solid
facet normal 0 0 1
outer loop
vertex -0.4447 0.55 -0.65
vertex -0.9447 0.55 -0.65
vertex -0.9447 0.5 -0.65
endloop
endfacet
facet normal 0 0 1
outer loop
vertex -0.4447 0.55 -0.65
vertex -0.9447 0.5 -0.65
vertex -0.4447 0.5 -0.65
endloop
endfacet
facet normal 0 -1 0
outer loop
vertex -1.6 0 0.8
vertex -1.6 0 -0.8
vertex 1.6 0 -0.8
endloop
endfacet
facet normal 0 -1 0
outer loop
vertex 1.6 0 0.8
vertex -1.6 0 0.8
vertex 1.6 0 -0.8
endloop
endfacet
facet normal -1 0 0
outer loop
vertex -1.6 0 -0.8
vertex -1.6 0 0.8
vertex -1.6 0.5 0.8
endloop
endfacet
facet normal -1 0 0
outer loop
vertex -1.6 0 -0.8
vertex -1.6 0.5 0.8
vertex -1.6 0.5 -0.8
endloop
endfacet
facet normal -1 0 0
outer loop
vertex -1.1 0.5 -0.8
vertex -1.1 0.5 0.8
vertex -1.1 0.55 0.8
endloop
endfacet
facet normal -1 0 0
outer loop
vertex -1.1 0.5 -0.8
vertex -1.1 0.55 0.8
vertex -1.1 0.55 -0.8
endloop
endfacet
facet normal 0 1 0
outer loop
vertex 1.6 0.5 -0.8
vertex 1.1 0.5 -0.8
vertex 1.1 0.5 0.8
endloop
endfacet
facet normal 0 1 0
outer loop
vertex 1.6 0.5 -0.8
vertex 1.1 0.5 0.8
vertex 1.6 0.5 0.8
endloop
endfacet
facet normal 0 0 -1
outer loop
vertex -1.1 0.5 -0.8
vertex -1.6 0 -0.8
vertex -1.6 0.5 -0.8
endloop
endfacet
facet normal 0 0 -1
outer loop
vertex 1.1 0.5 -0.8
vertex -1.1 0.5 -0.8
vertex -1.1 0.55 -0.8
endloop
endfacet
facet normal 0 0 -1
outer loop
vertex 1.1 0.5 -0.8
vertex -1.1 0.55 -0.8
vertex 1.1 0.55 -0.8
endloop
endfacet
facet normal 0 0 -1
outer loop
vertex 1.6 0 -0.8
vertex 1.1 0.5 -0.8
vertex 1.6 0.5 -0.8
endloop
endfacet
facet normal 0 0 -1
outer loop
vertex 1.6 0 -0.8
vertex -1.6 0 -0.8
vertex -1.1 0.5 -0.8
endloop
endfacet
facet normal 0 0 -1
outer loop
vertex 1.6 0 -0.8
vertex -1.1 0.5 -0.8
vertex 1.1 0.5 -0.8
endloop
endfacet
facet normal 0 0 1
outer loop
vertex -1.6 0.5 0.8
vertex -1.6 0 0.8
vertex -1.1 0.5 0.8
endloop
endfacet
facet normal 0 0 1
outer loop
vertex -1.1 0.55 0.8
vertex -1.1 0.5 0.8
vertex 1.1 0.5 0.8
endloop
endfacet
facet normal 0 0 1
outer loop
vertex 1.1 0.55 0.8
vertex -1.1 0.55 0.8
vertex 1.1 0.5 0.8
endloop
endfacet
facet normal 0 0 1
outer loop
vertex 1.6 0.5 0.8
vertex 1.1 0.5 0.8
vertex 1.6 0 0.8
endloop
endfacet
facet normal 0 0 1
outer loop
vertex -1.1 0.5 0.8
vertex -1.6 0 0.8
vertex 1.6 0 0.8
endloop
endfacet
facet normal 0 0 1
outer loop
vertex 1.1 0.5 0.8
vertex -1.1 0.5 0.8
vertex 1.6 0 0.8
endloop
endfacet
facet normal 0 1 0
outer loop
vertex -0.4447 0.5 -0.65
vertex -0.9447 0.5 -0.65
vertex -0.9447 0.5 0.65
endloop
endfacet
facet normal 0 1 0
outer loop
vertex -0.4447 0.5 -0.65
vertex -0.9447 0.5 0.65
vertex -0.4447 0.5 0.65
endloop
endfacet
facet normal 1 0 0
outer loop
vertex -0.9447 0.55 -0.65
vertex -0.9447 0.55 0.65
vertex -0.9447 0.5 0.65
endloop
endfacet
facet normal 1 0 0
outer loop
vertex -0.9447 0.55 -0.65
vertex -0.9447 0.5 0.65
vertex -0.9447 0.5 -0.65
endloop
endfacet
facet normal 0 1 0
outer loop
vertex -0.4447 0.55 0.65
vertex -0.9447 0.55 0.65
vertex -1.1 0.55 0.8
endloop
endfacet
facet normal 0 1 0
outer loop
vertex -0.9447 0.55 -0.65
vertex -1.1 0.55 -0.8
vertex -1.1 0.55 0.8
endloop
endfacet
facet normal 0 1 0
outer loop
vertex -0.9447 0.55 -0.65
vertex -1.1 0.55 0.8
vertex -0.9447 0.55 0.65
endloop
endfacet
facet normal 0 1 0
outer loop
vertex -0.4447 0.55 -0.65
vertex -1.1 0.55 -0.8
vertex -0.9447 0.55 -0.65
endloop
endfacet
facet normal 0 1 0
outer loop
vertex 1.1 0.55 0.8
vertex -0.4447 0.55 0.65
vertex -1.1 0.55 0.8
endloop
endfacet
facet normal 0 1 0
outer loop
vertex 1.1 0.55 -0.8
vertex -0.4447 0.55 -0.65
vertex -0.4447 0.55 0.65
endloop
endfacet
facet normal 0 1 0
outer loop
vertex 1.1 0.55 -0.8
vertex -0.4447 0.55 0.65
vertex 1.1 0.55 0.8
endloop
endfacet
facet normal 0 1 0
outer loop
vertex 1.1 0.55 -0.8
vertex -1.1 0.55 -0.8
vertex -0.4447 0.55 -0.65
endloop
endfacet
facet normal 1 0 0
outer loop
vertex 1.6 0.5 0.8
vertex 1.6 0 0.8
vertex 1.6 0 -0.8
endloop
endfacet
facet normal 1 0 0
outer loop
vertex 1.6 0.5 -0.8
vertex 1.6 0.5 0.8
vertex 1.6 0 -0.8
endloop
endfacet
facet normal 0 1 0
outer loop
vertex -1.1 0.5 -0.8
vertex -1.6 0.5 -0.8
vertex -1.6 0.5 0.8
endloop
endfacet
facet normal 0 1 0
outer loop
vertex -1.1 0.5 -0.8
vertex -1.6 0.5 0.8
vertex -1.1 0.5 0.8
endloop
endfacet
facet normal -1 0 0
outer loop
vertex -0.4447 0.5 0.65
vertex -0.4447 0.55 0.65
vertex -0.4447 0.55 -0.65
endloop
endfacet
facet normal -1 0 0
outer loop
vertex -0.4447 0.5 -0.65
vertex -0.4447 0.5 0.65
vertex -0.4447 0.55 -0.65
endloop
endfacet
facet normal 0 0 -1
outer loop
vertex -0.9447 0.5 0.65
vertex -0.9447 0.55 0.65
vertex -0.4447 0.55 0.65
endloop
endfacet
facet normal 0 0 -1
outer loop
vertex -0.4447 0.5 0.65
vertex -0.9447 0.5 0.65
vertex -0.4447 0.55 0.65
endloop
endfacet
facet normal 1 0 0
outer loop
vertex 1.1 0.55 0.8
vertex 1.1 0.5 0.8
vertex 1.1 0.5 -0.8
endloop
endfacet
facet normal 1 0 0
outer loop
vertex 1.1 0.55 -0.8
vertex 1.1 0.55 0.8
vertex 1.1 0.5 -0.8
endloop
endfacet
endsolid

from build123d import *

# Parameters (mm, degrees)
SKETCH1_W           = 3.2
SKETCH1_H           = 1.6
BOSS_EXTRUDE1_DEPTH = 0.5
SKETCH2_W           = 2.2
SKETCH2_H           = 1.6
BOSS_EXTRUDE2_DEPTH = 0.05
SKETCH3_W           = 0.5
SKETCH3_H           = 1.3
CUT_EXTRUDE1_DEPTH  = 0.05


with BuildPart() as part:
    # Sketch1 → Boss-Extrude1 (new body)
    with BuildSketch(Plane(origin=(0, 0, 0), x_dir=(1, 0, 0), z_dir=(0, 1, 0))):
        Rectangle(SKETCH1_W, SKETCH1_H)
    extrude(amount=BOSS_EXTRUDE1_DEPTH)

    # Sketch2 → Boss-Extrude2 (add)
    with BuildSketch(Plane(origin=(0, 0.5, 0), x_dir=(1, 0, 0), z_dir=(0, 1, 0))):
        Rectangle(SKETCH2_W, SKETCH2_H)
    extrude(amount=BOSS_EXTRUDE2_DEPTH)

    # Sketch3 → Cut-Extrude1 (cut)
    with BuildSketch(Plane(origin=(0, 0.55, 0), x_dir=(1, 0, 0), z_dir=(0, 1, 0))):
        with Locations((-0.694727383, 0)):
            Rectangle(SKETCH3_W, SKETCH3_H)
    extrude(amount=-CUT_EXTRUDE1_DEPTH, mode=Mode.SUBTRACT)


solid = part.part
